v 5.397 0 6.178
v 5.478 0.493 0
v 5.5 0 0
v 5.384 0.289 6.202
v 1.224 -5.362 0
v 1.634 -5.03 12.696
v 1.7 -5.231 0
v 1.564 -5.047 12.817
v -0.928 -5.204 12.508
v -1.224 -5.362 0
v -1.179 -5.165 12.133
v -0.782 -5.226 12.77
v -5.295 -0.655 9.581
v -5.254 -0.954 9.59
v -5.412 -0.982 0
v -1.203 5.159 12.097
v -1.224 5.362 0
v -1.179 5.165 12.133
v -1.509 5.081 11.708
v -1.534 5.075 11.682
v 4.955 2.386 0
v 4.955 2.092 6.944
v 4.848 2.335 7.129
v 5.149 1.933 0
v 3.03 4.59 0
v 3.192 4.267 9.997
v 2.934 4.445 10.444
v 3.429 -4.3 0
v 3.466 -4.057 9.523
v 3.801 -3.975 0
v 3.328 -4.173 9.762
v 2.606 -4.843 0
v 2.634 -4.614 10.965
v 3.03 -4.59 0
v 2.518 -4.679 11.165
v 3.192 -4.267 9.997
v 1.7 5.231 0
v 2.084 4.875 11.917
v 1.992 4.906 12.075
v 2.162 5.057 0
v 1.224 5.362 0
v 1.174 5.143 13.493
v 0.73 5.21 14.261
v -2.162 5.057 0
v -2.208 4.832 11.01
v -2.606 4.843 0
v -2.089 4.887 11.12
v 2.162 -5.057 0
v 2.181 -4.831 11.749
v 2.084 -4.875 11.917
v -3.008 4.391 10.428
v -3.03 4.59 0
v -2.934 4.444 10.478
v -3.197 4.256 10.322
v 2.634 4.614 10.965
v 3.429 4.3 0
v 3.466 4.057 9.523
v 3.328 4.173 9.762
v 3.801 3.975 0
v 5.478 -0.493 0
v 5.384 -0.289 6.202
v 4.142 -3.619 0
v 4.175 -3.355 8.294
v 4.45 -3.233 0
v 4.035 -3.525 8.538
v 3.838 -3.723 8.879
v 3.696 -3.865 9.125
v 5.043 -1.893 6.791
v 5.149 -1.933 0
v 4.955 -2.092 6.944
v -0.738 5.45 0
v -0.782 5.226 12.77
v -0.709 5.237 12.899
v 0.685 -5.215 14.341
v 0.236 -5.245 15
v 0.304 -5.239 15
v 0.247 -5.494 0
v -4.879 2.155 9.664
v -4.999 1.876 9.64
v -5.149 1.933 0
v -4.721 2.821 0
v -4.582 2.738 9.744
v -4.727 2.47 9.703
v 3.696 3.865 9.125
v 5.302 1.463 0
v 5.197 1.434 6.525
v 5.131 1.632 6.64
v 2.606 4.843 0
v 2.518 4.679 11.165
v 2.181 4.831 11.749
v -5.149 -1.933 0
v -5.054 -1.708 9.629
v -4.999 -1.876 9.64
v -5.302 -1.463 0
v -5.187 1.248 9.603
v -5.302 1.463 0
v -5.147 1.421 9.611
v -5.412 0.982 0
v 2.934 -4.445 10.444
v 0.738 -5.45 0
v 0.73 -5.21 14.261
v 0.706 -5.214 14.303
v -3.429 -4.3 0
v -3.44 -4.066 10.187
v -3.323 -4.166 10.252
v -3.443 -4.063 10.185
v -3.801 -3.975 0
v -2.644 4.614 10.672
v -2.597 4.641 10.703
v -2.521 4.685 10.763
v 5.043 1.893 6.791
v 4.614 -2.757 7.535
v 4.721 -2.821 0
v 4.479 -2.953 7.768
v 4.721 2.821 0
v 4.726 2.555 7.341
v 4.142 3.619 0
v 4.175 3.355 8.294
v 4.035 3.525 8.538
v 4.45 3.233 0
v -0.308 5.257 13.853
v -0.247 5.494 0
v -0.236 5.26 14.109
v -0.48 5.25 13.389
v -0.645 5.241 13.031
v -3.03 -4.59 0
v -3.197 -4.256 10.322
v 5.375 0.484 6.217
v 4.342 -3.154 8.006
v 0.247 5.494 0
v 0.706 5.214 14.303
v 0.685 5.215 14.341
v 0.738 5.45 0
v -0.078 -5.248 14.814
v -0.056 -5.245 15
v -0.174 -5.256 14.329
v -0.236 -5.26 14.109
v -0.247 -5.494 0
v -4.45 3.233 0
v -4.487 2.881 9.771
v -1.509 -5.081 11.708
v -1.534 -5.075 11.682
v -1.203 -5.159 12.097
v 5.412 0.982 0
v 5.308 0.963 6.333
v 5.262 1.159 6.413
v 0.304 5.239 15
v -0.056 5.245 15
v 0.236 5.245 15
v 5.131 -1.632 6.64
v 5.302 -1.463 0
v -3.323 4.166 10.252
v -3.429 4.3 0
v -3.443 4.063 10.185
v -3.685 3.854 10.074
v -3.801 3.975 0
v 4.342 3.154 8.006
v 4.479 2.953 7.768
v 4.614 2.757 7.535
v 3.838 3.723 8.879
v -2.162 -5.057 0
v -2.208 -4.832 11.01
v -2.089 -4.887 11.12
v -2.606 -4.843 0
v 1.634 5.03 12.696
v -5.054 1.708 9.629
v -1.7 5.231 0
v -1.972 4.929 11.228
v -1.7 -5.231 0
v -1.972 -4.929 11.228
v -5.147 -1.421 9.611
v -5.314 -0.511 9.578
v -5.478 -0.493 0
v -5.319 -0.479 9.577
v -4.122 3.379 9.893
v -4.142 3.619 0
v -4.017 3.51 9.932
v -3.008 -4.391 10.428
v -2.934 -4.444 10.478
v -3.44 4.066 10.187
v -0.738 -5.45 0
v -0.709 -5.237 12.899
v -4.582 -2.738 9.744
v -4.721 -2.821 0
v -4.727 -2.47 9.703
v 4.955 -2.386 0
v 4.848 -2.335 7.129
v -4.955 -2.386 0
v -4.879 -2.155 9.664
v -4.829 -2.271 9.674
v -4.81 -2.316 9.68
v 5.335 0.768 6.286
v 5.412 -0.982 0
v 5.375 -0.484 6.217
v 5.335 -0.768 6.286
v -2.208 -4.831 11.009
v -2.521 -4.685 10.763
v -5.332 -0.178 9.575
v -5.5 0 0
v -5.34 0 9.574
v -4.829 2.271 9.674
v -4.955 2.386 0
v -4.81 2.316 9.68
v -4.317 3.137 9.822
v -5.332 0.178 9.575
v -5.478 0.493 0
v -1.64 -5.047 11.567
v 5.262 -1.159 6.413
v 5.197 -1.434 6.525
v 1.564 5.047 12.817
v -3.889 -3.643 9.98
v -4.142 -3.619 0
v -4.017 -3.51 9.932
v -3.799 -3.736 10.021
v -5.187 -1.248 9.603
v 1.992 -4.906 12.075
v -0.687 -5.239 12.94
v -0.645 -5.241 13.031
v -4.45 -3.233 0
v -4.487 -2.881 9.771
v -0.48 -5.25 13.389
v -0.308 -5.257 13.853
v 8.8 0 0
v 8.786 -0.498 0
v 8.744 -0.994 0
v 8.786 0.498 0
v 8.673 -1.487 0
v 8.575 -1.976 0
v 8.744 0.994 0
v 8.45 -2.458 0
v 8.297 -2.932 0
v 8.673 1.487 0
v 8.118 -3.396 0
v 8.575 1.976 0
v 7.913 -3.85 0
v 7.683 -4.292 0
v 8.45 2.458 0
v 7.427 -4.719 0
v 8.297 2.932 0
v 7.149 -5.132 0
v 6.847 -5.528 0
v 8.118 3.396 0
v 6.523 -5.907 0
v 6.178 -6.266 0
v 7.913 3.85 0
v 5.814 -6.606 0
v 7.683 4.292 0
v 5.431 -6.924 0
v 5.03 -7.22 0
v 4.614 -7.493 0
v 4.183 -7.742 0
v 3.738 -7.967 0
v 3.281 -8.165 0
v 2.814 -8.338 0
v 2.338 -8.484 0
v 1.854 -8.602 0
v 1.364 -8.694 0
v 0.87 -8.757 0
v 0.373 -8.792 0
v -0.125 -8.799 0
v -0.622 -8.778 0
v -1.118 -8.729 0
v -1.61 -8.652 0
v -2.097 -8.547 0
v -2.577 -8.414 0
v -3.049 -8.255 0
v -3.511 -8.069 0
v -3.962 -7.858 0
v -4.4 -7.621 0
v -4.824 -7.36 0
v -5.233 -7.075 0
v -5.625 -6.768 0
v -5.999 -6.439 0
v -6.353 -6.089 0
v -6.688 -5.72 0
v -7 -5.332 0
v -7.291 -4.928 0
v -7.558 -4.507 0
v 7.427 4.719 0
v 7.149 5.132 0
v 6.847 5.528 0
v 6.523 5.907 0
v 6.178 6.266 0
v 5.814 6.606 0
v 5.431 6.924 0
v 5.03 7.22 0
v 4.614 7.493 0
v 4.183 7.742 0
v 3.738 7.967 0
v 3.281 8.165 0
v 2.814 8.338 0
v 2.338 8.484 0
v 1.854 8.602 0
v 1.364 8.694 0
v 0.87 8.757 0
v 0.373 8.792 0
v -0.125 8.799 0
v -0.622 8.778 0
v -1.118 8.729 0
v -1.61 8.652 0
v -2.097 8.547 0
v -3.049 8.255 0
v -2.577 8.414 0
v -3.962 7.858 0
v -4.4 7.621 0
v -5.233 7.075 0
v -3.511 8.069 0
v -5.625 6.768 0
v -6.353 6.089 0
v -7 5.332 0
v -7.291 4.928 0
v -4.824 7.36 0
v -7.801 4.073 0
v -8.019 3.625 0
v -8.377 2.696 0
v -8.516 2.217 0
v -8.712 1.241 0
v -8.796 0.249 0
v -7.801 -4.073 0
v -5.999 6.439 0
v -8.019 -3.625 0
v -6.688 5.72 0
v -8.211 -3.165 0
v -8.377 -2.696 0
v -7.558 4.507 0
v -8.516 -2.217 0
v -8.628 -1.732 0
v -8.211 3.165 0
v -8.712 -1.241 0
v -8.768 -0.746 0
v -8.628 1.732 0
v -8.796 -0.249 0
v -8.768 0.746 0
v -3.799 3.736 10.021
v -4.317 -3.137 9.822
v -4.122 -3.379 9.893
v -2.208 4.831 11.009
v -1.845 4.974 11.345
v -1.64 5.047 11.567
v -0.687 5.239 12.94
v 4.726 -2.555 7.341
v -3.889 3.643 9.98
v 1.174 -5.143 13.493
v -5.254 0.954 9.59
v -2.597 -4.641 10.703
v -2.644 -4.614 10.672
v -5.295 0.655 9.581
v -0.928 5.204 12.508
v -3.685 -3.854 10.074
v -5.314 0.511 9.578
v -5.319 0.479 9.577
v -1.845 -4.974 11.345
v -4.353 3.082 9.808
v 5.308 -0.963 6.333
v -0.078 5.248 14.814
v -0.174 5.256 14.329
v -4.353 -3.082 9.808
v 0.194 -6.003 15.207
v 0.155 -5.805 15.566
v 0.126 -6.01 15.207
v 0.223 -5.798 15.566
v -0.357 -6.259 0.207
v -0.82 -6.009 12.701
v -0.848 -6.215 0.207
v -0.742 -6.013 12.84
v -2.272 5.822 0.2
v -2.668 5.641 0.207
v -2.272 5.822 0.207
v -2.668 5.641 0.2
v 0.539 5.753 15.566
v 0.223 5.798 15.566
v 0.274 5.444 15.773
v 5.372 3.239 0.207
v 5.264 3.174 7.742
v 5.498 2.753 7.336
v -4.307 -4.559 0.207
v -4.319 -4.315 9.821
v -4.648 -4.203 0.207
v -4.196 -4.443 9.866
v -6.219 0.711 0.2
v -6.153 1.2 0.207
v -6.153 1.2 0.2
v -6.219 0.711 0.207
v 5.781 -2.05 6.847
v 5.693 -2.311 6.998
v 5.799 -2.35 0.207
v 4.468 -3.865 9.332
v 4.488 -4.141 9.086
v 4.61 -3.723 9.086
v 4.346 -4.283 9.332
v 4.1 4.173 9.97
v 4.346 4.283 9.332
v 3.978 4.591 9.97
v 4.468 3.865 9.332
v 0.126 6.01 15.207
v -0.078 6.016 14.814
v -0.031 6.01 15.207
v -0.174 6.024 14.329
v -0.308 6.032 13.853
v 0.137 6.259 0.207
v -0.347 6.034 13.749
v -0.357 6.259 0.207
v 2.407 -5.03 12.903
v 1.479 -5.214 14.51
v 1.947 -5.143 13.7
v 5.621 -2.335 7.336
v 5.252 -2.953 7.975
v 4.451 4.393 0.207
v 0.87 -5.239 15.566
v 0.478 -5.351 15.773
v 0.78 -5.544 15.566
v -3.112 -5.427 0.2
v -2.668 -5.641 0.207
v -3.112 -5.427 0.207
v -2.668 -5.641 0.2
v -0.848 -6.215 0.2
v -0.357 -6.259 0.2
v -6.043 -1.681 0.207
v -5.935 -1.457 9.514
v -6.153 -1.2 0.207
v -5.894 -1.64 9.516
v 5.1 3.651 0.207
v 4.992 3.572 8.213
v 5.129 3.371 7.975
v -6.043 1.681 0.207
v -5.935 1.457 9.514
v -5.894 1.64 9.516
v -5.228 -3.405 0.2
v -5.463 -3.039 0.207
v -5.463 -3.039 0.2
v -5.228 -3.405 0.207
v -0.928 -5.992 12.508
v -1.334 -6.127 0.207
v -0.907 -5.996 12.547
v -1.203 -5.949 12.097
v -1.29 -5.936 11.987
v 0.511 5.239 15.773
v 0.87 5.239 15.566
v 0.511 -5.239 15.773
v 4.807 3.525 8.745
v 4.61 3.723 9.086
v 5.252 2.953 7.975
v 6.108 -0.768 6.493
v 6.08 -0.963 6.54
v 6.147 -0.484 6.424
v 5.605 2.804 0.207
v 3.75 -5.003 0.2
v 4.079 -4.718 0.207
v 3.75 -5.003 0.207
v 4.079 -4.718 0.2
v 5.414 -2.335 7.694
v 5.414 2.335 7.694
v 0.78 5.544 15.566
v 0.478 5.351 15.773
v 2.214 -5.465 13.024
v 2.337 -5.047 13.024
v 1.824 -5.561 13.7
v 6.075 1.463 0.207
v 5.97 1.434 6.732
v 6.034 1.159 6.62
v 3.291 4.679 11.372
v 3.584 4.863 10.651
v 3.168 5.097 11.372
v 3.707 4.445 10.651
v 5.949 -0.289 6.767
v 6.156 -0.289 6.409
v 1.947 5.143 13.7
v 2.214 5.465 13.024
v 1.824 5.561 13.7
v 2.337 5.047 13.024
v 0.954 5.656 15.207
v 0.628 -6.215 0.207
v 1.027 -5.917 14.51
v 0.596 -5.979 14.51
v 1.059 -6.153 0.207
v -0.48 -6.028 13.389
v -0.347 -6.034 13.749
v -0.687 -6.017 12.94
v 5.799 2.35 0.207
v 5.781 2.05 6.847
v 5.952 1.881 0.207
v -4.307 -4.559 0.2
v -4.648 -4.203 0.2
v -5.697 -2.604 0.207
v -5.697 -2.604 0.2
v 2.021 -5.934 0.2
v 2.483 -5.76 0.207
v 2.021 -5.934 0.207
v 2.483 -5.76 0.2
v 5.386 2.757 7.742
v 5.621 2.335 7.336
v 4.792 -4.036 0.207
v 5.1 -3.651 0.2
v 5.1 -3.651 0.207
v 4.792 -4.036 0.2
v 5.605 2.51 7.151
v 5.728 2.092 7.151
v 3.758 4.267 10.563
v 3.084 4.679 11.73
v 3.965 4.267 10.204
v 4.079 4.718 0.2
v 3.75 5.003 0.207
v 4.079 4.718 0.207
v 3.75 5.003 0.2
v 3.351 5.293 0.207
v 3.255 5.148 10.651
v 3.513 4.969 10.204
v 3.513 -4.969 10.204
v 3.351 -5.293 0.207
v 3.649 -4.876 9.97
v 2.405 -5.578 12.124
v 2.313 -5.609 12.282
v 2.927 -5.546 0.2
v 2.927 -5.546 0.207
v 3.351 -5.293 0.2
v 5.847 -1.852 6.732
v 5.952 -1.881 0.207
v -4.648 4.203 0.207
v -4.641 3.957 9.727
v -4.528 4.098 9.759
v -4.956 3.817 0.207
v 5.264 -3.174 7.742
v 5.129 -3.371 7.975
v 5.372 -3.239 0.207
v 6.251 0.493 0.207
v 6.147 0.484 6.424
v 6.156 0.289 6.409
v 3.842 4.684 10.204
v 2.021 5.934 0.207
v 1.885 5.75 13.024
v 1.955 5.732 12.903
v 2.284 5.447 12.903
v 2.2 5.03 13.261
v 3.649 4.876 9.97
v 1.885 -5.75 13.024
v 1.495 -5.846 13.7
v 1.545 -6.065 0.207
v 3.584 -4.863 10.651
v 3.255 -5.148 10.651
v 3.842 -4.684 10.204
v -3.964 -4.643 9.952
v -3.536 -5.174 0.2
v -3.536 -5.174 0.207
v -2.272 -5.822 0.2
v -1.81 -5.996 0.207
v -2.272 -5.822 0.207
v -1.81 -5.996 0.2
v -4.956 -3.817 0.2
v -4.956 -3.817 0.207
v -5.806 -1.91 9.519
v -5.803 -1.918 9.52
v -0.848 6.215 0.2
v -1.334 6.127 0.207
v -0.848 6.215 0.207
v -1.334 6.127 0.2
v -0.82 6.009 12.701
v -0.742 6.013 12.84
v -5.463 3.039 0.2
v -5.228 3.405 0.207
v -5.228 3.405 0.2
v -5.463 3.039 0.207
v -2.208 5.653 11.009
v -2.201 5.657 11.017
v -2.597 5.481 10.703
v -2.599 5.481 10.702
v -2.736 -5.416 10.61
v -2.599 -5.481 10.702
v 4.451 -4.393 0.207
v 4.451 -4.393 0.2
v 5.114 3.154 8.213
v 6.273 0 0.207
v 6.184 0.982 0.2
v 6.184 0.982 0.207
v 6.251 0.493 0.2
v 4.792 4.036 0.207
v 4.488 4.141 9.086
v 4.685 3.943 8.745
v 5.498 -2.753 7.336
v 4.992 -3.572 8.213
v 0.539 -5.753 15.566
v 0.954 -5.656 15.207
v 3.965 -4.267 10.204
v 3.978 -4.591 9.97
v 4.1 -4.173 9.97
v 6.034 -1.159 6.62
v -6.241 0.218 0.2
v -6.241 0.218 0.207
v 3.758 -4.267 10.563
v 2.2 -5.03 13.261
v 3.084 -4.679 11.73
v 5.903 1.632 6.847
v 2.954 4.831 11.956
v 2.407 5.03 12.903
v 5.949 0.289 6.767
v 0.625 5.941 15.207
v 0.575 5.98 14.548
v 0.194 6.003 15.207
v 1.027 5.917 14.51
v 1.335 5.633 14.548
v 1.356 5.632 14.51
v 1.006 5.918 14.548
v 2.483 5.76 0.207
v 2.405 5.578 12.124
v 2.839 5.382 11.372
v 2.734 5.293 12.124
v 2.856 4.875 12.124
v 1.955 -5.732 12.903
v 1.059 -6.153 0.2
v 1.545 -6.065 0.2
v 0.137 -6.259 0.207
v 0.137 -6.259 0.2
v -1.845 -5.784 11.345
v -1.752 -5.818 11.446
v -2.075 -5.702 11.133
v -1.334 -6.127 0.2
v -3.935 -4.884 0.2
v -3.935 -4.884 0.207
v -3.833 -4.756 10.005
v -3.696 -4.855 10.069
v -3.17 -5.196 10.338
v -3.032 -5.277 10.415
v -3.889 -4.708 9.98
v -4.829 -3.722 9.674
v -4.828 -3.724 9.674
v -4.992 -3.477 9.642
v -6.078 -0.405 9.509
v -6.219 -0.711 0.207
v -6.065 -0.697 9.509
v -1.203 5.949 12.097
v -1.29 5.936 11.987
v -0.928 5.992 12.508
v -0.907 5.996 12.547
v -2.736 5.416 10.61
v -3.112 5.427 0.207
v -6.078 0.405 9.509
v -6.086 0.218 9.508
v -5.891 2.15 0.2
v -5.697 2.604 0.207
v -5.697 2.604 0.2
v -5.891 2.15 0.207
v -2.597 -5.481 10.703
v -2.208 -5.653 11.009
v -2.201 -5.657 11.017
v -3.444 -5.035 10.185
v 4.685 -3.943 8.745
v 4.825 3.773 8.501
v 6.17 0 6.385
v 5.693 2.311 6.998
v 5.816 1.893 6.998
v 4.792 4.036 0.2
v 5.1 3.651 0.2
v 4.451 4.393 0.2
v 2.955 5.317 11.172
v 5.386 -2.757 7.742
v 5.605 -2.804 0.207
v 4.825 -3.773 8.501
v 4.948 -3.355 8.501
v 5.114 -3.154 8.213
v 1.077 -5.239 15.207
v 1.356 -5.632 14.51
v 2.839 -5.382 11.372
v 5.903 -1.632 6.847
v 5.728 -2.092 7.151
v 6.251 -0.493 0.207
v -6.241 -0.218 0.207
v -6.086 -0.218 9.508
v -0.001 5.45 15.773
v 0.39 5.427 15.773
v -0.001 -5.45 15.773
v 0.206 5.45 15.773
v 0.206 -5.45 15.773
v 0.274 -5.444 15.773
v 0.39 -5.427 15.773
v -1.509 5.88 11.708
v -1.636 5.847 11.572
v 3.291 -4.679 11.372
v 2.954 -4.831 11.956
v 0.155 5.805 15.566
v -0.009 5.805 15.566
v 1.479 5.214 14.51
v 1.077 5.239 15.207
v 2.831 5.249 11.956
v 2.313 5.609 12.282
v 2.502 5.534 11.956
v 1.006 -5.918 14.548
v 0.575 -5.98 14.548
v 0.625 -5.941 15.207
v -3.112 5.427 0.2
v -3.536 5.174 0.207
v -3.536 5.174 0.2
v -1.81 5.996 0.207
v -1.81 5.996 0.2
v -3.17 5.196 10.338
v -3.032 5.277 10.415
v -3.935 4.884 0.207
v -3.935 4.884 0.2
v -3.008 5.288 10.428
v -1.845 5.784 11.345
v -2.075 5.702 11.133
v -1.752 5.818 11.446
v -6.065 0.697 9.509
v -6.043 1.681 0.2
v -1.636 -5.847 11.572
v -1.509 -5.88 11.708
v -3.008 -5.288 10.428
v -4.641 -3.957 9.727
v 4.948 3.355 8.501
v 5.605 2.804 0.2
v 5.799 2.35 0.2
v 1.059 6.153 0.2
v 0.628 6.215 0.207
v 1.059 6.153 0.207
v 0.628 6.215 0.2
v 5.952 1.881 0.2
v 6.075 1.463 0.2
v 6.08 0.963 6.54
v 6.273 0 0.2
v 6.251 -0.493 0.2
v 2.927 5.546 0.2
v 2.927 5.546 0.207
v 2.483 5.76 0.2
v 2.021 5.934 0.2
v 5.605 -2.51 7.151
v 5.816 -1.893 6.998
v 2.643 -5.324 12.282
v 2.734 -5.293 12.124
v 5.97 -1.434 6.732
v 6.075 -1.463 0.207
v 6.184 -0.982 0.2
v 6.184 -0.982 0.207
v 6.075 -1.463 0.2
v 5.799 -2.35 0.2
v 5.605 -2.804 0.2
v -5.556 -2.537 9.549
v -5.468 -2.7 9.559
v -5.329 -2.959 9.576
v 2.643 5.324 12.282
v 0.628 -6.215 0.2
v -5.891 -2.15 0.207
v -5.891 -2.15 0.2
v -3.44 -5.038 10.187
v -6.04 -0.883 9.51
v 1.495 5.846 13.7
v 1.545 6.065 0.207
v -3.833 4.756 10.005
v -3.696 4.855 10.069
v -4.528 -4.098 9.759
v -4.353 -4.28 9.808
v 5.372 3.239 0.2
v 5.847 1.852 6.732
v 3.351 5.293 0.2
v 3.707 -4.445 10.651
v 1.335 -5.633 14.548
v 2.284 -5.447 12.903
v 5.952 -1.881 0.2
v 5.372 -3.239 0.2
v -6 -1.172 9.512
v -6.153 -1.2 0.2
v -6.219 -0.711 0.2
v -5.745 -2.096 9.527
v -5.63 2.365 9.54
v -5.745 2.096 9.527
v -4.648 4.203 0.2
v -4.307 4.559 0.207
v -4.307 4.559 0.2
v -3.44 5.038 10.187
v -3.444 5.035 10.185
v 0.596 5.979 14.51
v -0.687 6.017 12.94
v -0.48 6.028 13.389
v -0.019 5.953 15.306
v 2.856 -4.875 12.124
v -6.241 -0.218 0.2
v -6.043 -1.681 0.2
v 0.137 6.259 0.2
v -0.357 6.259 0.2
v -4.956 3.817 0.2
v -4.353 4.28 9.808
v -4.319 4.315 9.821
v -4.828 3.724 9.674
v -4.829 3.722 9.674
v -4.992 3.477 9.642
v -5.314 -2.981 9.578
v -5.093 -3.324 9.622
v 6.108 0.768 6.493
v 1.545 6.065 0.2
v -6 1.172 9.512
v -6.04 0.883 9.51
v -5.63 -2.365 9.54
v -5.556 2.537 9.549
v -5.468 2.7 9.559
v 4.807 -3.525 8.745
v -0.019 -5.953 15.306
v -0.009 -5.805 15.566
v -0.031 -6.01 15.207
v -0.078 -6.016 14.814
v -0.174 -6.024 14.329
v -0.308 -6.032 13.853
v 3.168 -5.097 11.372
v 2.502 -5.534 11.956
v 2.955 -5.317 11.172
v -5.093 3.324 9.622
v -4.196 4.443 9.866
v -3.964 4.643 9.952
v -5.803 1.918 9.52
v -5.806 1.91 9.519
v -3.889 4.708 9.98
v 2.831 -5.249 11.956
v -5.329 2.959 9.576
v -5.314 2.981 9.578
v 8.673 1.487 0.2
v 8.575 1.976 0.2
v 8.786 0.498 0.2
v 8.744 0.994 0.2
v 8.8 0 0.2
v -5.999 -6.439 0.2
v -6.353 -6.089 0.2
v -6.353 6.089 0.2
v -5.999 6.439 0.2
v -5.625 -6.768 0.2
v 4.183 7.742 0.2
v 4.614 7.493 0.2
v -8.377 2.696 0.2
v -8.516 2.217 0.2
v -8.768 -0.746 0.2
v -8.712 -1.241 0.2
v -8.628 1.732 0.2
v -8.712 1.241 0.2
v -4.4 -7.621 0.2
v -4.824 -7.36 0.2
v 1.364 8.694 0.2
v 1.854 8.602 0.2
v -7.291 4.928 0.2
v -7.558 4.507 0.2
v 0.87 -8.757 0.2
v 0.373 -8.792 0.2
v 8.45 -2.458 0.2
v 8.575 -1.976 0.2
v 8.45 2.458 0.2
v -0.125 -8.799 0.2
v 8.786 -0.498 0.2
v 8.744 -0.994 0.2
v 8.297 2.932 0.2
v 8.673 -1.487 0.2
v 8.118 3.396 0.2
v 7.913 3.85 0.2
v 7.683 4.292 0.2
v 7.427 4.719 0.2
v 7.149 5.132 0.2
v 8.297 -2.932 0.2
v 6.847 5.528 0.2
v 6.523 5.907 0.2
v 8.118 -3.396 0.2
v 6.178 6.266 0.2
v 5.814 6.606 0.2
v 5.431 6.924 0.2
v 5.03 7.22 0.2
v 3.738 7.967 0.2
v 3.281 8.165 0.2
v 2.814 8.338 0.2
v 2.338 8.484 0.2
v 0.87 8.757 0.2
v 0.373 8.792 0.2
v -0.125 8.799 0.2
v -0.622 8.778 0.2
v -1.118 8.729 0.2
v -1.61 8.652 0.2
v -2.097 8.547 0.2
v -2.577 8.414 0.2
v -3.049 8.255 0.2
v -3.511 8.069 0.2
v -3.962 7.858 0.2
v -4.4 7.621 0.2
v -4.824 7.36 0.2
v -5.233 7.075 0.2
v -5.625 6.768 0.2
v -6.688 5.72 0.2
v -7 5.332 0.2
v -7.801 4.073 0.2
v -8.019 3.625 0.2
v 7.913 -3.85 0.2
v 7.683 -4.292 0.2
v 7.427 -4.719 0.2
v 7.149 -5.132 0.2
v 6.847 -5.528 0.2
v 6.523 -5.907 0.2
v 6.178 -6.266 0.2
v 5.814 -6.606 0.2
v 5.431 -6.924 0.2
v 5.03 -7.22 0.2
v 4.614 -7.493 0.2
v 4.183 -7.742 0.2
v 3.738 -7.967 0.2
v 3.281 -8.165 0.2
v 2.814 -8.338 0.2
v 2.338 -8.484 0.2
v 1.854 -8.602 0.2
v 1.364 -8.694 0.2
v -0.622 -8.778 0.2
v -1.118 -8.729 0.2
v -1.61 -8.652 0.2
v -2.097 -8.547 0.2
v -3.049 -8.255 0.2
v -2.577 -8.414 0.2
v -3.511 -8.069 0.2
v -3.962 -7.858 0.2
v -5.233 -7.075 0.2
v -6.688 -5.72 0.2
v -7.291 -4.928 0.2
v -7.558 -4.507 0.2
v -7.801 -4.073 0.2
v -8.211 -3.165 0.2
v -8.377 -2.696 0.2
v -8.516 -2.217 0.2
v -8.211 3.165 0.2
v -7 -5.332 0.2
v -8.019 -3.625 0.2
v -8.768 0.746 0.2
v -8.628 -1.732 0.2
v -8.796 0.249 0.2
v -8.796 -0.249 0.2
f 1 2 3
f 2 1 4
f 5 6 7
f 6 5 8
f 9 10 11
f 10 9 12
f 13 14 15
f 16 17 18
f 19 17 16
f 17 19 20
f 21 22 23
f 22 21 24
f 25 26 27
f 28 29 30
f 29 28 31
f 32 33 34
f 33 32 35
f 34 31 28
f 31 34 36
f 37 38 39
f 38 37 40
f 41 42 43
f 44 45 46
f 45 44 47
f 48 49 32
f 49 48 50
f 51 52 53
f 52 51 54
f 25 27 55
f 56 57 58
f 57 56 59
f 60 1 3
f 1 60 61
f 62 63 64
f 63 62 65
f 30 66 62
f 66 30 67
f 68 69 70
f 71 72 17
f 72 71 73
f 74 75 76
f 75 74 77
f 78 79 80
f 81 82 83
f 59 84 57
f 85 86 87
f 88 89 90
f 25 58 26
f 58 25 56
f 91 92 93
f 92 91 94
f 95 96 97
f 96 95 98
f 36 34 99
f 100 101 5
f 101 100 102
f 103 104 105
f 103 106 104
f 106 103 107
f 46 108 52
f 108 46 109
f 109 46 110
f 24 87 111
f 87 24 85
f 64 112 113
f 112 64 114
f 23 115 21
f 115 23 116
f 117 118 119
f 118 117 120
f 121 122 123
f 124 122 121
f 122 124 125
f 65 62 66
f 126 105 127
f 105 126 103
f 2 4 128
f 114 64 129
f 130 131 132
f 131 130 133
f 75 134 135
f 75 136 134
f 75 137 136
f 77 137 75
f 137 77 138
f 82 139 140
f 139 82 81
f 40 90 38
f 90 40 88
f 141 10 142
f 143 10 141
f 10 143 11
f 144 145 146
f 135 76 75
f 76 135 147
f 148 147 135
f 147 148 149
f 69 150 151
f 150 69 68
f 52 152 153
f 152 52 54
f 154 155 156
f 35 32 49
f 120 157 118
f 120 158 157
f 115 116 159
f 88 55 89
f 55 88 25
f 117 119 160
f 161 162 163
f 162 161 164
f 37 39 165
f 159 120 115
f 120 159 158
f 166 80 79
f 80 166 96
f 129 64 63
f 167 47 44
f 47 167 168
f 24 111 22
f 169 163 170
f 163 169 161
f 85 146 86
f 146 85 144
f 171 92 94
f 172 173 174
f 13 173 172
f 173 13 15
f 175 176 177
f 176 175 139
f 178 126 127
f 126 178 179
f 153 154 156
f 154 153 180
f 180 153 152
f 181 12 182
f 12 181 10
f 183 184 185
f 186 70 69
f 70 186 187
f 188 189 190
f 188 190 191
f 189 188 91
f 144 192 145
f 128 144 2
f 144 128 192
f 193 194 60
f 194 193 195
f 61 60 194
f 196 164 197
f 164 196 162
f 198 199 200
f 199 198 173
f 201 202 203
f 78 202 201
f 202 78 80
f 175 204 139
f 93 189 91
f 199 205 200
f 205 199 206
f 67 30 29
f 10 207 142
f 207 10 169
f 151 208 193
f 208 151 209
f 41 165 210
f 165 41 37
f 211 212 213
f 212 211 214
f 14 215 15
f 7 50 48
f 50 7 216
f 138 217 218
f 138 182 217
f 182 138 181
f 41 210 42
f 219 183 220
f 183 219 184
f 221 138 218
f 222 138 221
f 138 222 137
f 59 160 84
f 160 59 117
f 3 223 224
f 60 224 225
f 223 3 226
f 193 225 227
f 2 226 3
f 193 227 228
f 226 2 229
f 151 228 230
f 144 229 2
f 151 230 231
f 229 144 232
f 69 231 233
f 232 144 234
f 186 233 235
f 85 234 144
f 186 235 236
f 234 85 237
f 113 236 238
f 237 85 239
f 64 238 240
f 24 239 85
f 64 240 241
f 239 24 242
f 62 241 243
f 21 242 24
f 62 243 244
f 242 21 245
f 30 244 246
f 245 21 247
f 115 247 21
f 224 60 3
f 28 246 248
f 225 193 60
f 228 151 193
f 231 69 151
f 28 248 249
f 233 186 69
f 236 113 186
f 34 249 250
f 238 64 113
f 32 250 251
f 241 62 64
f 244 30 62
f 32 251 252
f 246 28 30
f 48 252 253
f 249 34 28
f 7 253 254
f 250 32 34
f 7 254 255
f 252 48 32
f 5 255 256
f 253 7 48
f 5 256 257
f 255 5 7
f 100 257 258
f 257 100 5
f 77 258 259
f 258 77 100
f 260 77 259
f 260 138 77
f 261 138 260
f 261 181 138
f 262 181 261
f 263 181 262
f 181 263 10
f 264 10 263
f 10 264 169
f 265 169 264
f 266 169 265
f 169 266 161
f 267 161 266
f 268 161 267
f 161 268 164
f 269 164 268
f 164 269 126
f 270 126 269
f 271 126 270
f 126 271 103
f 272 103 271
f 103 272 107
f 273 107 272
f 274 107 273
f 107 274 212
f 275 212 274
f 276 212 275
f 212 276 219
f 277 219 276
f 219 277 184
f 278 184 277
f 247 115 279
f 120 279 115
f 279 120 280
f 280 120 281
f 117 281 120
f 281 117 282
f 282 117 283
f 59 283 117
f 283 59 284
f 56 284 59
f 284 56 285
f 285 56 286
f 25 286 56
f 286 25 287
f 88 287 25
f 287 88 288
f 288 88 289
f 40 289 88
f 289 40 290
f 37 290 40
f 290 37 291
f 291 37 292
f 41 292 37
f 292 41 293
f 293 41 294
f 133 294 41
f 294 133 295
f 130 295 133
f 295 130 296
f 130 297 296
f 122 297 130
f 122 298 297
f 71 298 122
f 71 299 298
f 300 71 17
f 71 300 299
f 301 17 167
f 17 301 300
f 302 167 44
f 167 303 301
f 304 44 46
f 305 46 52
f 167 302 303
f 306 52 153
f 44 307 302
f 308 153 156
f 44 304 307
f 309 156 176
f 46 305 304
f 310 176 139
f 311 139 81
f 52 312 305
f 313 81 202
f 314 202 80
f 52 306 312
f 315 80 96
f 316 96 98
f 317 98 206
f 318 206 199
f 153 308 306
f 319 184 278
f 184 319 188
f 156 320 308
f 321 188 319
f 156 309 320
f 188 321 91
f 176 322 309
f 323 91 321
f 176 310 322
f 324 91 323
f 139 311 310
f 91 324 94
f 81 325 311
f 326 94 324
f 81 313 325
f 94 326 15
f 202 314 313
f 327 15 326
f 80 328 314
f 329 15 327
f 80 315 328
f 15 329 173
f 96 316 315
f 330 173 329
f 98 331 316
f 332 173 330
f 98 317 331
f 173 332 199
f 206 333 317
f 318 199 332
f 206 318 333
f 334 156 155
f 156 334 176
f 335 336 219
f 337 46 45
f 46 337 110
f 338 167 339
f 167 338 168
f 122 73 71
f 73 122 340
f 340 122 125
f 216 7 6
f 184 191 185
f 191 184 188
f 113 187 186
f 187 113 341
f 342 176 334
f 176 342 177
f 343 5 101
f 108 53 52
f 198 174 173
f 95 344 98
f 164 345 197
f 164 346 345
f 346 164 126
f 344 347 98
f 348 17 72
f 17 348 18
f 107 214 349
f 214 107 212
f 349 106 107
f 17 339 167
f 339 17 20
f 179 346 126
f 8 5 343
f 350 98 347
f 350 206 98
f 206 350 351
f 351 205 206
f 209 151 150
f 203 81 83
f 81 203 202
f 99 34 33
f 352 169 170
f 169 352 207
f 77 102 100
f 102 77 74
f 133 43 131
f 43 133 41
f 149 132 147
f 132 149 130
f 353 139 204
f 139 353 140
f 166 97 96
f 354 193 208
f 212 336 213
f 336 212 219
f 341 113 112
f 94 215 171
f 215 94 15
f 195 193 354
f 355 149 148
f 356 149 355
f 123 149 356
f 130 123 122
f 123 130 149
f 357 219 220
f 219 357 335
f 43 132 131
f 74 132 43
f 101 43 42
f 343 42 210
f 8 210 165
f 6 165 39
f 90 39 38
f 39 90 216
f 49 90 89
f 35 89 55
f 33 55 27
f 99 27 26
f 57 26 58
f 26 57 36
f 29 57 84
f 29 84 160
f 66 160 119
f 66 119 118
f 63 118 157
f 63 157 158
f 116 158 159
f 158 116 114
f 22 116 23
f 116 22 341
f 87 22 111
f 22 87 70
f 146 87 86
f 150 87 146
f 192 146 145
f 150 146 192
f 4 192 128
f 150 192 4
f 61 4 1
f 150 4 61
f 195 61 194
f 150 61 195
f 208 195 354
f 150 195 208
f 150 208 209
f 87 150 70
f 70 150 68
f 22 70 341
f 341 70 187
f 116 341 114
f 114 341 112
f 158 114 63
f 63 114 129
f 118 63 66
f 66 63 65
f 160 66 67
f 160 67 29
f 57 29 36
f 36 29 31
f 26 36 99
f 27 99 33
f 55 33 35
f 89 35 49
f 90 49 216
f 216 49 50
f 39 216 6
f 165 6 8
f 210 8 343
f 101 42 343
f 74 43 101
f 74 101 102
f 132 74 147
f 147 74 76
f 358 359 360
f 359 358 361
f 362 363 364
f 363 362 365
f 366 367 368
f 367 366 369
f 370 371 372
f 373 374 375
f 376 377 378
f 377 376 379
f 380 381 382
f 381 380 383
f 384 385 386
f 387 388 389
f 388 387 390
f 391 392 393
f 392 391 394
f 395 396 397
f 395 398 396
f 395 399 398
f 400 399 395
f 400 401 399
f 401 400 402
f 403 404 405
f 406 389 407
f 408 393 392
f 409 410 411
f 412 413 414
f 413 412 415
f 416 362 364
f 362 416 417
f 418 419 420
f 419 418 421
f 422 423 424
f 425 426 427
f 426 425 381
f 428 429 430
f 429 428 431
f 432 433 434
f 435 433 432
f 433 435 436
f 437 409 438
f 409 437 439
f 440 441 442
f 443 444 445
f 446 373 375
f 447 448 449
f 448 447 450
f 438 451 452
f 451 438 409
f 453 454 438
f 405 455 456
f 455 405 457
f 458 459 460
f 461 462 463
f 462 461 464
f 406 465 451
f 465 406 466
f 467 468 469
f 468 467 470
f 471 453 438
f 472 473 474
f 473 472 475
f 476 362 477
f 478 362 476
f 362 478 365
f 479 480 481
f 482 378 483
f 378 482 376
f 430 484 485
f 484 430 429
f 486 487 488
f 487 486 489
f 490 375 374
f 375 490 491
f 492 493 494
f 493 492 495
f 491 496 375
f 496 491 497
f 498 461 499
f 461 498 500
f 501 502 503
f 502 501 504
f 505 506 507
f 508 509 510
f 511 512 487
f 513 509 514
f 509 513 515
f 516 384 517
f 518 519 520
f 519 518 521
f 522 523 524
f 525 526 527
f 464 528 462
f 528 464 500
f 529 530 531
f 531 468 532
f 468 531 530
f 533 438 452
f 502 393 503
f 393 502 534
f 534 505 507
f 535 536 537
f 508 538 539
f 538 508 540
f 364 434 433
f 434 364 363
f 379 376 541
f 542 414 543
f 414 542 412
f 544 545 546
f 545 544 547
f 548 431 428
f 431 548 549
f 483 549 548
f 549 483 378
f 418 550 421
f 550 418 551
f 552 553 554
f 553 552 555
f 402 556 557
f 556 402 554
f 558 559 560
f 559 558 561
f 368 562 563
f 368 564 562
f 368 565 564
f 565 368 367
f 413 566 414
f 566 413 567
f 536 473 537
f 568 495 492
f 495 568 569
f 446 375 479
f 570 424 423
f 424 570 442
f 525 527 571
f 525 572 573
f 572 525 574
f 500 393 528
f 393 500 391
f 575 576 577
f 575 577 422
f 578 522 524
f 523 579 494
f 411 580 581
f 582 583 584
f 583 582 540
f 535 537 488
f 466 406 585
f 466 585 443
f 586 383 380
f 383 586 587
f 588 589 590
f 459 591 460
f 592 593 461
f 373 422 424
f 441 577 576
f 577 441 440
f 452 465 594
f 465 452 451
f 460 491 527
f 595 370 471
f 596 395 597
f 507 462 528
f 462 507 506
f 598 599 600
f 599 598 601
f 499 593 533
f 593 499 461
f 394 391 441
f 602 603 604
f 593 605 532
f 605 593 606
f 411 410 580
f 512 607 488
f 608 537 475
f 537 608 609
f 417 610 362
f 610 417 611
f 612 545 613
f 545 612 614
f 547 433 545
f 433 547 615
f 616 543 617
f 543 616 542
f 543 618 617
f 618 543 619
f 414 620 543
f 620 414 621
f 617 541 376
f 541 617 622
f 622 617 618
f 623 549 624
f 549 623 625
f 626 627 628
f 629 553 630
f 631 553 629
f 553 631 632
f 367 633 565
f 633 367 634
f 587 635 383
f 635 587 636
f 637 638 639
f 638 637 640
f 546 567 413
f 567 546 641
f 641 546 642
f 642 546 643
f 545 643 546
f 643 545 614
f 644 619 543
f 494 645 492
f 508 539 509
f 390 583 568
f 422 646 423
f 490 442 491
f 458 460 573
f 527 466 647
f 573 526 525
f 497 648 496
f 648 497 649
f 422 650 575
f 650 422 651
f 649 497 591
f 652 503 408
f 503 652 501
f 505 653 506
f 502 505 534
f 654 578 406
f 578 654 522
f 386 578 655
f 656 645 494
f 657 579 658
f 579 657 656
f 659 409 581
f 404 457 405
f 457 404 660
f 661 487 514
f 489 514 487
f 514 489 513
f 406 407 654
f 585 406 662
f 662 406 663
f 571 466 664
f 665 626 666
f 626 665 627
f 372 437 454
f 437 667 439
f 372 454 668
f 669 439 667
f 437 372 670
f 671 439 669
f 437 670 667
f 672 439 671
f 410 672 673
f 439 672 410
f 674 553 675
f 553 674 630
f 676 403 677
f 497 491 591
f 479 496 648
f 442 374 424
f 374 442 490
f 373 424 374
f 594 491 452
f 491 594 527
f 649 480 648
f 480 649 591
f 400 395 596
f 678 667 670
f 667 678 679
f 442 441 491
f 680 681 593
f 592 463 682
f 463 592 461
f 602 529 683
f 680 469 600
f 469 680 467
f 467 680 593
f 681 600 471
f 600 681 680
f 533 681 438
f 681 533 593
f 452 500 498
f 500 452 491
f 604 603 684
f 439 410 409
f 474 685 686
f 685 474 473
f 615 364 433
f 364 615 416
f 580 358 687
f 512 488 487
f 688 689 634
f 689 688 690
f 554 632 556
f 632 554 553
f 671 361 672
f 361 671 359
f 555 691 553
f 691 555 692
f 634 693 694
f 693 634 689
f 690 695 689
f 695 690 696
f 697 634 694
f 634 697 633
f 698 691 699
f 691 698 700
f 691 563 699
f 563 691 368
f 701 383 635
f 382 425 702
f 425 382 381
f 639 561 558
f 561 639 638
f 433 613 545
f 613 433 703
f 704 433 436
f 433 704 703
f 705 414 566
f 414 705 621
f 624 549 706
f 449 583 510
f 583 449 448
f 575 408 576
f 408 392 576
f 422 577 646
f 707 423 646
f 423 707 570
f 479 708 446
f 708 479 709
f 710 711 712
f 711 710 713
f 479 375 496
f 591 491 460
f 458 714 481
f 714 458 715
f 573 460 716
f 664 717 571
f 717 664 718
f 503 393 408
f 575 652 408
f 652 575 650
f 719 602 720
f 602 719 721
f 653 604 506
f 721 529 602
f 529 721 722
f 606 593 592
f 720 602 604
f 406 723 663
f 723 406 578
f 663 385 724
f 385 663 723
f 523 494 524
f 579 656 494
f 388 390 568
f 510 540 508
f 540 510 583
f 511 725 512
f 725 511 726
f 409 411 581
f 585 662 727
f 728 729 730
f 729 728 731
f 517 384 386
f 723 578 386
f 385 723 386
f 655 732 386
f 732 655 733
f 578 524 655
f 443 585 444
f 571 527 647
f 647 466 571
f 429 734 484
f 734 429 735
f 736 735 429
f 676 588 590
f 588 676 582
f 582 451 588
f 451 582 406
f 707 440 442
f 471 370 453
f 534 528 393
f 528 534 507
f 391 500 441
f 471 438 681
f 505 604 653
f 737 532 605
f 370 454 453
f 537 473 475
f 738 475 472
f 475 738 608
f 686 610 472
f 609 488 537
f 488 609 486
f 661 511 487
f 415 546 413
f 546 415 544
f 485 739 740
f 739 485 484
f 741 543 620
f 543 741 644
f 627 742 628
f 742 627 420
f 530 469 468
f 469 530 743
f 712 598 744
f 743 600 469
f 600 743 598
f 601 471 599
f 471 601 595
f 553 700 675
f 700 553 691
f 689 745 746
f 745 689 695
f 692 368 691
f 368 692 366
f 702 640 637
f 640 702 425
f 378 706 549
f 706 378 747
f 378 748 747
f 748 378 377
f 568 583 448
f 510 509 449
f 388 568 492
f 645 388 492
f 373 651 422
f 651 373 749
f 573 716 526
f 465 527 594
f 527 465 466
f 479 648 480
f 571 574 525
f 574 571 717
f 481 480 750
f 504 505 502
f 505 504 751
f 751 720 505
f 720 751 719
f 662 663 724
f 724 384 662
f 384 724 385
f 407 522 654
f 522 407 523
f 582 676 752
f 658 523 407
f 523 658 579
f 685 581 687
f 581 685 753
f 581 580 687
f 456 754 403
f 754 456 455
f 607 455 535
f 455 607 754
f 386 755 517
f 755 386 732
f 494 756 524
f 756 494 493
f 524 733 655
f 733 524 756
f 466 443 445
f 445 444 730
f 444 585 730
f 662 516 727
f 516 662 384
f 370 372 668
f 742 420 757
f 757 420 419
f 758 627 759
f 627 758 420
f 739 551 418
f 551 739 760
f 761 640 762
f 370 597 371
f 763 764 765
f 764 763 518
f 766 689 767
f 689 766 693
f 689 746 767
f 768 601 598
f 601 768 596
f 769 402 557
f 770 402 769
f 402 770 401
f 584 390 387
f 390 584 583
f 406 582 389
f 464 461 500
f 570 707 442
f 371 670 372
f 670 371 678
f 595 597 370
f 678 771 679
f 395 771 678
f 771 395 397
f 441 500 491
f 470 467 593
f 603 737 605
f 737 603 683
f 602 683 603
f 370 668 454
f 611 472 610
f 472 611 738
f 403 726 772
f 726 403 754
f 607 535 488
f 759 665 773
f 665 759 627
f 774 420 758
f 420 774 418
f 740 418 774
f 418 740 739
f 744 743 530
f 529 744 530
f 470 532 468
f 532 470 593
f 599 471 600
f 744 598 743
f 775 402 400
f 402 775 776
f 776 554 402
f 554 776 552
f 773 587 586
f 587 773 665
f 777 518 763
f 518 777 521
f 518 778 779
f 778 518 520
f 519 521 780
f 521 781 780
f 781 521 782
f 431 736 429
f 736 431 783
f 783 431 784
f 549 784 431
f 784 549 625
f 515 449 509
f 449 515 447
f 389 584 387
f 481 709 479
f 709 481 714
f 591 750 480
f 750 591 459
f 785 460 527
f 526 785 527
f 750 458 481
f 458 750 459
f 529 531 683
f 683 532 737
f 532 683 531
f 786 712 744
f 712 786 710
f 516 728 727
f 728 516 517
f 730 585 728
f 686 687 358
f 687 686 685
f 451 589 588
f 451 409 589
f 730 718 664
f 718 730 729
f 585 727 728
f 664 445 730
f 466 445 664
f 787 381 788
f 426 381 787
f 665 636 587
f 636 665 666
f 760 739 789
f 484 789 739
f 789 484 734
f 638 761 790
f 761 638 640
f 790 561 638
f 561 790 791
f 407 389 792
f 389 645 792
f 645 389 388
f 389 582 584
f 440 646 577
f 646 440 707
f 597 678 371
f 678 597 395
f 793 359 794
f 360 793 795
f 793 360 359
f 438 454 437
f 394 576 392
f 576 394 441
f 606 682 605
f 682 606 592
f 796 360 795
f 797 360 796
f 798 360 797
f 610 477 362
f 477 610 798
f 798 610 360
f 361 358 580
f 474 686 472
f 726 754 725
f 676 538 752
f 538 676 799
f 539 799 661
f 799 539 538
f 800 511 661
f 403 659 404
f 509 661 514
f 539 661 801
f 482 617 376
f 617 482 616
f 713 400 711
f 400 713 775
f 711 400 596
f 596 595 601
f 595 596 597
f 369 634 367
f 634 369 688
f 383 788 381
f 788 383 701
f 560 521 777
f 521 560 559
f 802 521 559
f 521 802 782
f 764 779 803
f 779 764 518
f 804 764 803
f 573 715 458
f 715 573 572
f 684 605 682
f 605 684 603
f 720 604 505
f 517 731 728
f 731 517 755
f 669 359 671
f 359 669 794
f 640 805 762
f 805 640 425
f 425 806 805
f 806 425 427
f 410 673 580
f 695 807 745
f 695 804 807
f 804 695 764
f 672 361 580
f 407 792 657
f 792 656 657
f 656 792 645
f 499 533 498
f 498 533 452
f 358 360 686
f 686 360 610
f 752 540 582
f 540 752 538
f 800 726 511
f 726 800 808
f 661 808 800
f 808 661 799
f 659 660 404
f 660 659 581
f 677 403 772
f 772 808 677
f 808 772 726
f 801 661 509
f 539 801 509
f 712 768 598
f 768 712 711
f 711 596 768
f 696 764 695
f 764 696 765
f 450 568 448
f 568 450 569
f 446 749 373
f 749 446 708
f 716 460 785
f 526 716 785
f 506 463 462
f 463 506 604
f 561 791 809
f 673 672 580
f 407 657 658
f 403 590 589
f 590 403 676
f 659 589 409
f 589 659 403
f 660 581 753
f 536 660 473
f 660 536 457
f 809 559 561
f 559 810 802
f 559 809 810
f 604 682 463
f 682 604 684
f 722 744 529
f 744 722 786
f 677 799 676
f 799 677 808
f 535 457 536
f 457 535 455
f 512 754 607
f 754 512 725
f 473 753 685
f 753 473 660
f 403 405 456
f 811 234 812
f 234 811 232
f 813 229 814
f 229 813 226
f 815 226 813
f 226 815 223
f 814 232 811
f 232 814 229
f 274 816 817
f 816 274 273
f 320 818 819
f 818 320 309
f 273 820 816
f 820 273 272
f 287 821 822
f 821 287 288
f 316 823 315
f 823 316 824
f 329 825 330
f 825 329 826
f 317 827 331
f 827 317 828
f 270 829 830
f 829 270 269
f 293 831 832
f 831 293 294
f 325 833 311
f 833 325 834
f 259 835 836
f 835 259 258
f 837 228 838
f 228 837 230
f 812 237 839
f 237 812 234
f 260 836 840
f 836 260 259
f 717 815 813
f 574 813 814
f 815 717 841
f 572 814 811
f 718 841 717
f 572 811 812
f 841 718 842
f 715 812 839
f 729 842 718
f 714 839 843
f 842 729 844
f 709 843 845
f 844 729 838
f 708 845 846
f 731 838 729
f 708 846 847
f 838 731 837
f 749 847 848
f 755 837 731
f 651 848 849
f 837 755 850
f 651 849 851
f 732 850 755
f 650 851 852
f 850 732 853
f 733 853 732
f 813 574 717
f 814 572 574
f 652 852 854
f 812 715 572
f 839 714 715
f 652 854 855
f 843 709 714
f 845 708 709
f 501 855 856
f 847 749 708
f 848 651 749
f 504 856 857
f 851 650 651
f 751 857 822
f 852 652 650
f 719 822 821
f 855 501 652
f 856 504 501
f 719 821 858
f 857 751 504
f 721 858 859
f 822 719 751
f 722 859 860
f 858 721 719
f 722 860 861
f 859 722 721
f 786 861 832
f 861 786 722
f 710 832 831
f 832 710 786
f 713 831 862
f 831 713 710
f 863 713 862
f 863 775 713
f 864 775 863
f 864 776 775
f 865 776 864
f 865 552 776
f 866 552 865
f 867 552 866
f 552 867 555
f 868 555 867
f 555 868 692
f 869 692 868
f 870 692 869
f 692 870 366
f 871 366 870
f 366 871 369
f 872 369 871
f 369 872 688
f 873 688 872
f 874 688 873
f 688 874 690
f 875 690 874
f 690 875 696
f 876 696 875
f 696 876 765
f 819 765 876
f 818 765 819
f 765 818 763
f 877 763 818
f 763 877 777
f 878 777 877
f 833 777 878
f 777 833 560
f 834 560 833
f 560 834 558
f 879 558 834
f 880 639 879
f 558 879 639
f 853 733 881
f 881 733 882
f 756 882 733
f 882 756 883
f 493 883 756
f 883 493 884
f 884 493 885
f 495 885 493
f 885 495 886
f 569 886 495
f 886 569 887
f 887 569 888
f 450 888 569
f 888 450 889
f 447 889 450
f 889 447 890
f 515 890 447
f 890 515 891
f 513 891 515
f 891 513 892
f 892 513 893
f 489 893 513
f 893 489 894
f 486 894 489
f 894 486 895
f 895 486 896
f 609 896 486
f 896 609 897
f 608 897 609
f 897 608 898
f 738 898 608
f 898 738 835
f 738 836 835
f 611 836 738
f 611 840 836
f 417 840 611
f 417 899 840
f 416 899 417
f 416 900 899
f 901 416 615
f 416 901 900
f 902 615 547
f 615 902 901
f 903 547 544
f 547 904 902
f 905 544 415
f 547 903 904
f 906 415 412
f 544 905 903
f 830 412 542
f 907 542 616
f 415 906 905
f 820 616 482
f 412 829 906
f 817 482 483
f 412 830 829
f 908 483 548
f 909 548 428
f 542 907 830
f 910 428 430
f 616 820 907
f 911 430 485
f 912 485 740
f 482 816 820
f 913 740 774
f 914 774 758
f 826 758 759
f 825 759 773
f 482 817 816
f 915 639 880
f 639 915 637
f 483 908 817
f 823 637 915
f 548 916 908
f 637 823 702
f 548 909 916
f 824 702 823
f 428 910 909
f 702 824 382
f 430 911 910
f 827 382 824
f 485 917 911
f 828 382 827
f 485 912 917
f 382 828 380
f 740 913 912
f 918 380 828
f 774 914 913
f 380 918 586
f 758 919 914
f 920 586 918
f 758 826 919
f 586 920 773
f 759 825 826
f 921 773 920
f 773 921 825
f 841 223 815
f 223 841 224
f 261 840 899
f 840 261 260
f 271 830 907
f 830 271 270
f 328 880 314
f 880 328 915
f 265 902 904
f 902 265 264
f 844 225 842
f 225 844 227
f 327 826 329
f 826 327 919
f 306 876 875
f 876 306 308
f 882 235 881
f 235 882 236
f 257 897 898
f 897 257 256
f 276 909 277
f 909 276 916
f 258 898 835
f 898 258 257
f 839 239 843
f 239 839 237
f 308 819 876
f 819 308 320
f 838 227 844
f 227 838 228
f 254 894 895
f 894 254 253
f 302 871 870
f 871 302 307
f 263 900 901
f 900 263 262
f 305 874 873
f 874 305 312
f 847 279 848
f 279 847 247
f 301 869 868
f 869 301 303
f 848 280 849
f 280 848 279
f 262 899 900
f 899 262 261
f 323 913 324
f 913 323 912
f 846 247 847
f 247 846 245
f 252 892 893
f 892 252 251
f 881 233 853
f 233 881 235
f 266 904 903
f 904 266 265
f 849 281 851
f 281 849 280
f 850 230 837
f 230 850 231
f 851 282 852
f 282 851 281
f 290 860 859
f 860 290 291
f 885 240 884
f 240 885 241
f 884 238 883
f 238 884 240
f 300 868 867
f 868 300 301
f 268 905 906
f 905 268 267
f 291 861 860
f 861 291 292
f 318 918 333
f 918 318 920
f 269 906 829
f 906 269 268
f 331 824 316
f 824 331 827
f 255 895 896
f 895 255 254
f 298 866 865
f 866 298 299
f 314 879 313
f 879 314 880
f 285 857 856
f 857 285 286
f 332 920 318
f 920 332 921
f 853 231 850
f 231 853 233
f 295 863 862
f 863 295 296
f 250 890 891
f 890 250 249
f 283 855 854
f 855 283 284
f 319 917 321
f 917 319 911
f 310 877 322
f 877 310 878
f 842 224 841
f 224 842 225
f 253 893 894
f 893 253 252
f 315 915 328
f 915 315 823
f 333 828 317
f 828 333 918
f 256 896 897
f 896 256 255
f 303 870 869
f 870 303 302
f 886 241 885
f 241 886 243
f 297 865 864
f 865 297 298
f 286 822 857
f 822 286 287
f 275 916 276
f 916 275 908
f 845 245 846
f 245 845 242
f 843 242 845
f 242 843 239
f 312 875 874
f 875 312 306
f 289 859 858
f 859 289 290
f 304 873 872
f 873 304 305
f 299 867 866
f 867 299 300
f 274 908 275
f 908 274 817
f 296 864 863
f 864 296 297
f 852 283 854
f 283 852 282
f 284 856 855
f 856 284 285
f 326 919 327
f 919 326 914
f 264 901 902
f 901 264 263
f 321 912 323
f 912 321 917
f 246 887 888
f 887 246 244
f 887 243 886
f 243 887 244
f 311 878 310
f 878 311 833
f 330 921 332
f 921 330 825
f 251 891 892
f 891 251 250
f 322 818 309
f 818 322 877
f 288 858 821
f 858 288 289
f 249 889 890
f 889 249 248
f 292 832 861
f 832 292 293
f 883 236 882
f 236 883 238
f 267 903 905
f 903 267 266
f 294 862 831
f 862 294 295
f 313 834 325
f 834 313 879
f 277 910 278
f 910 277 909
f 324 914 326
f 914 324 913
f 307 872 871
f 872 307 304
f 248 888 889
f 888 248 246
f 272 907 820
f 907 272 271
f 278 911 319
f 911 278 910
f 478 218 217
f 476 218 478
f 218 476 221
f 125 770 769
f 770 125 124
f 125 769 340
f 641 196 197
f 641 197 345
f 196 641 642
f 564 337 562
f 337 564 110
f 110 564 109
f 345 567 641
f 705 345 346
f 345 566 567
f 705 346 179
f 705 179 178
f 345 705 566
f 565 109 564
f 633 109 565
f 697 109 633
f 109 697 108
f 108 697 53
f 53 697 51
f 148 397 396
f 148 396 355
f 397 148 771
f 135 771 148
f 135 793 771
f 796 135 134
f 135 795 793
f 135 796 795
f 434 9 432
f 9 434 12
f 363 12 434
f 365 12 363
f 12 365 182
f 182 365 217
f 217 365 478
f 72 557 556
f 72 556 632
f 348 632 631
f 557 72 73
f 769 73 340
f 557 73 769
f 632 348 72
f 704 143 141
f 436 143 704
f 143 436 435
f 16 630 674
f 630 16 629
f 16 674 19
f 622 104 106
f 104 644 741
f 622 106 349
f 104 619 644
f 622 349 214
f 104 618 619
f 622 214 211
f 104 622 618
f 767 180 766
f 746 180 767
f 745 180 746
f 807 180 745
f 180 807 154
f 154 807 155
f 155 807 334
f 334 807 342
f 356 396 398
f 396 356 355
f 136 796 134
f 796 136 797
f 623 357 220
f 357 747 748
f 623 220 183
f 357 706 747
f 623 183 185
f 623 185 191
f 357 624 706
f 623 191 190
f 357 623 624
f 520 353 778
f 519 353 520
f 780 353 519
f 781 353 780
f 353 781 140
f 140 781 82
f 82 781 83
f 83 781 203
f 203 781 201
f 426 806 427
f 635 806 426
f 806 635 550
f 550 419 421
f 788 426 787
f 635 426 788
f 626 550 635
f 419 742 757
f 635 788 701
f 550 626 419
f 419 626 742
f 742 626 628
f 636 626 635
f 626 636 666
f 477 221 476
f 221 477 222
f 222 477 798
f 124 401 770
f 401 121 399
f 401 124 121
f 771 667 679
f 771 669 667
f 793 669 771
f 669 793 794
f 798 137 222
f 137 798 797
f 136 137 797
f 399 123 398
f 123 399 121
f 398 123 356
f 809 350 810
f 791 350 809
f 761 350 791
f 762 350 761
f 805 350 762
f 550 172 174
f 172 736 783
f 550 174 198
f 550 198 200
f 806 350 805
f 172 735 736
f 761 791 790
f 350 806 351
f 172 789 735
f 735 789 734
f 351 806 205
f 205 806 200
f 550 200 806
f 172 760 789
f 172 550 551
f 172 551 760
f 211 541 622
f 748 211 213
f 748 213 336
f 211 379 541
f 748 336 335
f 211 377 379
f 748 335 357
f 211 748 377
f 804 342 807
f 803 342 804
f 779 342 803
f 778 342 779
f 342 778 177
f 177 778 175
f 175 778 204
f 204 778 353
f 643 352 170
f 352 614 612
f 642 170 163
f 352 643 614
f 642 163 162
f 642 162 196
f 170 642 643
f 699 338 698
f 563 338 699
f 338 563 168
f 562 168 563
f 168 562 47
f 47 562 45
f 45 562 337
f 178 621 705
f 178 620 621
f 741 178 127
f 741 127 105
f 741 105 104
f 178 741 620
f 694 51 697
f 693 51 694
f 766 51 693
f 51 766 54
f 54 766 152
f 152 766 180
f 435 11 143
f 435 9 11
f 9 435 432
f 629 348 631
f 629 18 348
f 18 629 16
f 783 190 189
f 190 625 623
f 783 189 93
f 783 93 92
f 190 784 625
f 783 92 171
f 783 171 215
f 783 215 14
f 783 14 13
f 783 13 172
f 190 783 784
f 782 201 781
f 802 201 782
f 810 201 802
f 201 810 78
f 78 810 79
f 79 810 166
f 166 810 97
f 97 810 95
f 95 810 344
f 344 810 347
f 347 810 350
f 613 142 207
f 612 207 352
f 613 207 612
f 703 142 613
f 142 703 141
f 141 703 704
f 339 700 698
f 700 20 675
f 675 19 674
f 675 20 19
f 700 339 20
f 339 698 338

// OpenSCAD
$fa=1;
$fs=.5;

id=11;
od=id+1.6;

module spout() {
	difference() {
		cylinder(15,id/2,(id-.5)/2,false);
		translate([id/2,-id,6]) rotate([0,-30,0]) cube(2*id,false);
	}
}

difference() {
	union() {
		minkowski() {spout();sphere((od-id)/2);}
		cylinder(0.2,(od+5)/2,(od+5)/2,false);
	}
	spout();
	translate([-od/2,0,15+(od-id)/2]) rotate([90,0,0]) cylinder(2*od,od/2,od/2,true);
	translate([0,0,-id]) cube(2*id,true);
}
